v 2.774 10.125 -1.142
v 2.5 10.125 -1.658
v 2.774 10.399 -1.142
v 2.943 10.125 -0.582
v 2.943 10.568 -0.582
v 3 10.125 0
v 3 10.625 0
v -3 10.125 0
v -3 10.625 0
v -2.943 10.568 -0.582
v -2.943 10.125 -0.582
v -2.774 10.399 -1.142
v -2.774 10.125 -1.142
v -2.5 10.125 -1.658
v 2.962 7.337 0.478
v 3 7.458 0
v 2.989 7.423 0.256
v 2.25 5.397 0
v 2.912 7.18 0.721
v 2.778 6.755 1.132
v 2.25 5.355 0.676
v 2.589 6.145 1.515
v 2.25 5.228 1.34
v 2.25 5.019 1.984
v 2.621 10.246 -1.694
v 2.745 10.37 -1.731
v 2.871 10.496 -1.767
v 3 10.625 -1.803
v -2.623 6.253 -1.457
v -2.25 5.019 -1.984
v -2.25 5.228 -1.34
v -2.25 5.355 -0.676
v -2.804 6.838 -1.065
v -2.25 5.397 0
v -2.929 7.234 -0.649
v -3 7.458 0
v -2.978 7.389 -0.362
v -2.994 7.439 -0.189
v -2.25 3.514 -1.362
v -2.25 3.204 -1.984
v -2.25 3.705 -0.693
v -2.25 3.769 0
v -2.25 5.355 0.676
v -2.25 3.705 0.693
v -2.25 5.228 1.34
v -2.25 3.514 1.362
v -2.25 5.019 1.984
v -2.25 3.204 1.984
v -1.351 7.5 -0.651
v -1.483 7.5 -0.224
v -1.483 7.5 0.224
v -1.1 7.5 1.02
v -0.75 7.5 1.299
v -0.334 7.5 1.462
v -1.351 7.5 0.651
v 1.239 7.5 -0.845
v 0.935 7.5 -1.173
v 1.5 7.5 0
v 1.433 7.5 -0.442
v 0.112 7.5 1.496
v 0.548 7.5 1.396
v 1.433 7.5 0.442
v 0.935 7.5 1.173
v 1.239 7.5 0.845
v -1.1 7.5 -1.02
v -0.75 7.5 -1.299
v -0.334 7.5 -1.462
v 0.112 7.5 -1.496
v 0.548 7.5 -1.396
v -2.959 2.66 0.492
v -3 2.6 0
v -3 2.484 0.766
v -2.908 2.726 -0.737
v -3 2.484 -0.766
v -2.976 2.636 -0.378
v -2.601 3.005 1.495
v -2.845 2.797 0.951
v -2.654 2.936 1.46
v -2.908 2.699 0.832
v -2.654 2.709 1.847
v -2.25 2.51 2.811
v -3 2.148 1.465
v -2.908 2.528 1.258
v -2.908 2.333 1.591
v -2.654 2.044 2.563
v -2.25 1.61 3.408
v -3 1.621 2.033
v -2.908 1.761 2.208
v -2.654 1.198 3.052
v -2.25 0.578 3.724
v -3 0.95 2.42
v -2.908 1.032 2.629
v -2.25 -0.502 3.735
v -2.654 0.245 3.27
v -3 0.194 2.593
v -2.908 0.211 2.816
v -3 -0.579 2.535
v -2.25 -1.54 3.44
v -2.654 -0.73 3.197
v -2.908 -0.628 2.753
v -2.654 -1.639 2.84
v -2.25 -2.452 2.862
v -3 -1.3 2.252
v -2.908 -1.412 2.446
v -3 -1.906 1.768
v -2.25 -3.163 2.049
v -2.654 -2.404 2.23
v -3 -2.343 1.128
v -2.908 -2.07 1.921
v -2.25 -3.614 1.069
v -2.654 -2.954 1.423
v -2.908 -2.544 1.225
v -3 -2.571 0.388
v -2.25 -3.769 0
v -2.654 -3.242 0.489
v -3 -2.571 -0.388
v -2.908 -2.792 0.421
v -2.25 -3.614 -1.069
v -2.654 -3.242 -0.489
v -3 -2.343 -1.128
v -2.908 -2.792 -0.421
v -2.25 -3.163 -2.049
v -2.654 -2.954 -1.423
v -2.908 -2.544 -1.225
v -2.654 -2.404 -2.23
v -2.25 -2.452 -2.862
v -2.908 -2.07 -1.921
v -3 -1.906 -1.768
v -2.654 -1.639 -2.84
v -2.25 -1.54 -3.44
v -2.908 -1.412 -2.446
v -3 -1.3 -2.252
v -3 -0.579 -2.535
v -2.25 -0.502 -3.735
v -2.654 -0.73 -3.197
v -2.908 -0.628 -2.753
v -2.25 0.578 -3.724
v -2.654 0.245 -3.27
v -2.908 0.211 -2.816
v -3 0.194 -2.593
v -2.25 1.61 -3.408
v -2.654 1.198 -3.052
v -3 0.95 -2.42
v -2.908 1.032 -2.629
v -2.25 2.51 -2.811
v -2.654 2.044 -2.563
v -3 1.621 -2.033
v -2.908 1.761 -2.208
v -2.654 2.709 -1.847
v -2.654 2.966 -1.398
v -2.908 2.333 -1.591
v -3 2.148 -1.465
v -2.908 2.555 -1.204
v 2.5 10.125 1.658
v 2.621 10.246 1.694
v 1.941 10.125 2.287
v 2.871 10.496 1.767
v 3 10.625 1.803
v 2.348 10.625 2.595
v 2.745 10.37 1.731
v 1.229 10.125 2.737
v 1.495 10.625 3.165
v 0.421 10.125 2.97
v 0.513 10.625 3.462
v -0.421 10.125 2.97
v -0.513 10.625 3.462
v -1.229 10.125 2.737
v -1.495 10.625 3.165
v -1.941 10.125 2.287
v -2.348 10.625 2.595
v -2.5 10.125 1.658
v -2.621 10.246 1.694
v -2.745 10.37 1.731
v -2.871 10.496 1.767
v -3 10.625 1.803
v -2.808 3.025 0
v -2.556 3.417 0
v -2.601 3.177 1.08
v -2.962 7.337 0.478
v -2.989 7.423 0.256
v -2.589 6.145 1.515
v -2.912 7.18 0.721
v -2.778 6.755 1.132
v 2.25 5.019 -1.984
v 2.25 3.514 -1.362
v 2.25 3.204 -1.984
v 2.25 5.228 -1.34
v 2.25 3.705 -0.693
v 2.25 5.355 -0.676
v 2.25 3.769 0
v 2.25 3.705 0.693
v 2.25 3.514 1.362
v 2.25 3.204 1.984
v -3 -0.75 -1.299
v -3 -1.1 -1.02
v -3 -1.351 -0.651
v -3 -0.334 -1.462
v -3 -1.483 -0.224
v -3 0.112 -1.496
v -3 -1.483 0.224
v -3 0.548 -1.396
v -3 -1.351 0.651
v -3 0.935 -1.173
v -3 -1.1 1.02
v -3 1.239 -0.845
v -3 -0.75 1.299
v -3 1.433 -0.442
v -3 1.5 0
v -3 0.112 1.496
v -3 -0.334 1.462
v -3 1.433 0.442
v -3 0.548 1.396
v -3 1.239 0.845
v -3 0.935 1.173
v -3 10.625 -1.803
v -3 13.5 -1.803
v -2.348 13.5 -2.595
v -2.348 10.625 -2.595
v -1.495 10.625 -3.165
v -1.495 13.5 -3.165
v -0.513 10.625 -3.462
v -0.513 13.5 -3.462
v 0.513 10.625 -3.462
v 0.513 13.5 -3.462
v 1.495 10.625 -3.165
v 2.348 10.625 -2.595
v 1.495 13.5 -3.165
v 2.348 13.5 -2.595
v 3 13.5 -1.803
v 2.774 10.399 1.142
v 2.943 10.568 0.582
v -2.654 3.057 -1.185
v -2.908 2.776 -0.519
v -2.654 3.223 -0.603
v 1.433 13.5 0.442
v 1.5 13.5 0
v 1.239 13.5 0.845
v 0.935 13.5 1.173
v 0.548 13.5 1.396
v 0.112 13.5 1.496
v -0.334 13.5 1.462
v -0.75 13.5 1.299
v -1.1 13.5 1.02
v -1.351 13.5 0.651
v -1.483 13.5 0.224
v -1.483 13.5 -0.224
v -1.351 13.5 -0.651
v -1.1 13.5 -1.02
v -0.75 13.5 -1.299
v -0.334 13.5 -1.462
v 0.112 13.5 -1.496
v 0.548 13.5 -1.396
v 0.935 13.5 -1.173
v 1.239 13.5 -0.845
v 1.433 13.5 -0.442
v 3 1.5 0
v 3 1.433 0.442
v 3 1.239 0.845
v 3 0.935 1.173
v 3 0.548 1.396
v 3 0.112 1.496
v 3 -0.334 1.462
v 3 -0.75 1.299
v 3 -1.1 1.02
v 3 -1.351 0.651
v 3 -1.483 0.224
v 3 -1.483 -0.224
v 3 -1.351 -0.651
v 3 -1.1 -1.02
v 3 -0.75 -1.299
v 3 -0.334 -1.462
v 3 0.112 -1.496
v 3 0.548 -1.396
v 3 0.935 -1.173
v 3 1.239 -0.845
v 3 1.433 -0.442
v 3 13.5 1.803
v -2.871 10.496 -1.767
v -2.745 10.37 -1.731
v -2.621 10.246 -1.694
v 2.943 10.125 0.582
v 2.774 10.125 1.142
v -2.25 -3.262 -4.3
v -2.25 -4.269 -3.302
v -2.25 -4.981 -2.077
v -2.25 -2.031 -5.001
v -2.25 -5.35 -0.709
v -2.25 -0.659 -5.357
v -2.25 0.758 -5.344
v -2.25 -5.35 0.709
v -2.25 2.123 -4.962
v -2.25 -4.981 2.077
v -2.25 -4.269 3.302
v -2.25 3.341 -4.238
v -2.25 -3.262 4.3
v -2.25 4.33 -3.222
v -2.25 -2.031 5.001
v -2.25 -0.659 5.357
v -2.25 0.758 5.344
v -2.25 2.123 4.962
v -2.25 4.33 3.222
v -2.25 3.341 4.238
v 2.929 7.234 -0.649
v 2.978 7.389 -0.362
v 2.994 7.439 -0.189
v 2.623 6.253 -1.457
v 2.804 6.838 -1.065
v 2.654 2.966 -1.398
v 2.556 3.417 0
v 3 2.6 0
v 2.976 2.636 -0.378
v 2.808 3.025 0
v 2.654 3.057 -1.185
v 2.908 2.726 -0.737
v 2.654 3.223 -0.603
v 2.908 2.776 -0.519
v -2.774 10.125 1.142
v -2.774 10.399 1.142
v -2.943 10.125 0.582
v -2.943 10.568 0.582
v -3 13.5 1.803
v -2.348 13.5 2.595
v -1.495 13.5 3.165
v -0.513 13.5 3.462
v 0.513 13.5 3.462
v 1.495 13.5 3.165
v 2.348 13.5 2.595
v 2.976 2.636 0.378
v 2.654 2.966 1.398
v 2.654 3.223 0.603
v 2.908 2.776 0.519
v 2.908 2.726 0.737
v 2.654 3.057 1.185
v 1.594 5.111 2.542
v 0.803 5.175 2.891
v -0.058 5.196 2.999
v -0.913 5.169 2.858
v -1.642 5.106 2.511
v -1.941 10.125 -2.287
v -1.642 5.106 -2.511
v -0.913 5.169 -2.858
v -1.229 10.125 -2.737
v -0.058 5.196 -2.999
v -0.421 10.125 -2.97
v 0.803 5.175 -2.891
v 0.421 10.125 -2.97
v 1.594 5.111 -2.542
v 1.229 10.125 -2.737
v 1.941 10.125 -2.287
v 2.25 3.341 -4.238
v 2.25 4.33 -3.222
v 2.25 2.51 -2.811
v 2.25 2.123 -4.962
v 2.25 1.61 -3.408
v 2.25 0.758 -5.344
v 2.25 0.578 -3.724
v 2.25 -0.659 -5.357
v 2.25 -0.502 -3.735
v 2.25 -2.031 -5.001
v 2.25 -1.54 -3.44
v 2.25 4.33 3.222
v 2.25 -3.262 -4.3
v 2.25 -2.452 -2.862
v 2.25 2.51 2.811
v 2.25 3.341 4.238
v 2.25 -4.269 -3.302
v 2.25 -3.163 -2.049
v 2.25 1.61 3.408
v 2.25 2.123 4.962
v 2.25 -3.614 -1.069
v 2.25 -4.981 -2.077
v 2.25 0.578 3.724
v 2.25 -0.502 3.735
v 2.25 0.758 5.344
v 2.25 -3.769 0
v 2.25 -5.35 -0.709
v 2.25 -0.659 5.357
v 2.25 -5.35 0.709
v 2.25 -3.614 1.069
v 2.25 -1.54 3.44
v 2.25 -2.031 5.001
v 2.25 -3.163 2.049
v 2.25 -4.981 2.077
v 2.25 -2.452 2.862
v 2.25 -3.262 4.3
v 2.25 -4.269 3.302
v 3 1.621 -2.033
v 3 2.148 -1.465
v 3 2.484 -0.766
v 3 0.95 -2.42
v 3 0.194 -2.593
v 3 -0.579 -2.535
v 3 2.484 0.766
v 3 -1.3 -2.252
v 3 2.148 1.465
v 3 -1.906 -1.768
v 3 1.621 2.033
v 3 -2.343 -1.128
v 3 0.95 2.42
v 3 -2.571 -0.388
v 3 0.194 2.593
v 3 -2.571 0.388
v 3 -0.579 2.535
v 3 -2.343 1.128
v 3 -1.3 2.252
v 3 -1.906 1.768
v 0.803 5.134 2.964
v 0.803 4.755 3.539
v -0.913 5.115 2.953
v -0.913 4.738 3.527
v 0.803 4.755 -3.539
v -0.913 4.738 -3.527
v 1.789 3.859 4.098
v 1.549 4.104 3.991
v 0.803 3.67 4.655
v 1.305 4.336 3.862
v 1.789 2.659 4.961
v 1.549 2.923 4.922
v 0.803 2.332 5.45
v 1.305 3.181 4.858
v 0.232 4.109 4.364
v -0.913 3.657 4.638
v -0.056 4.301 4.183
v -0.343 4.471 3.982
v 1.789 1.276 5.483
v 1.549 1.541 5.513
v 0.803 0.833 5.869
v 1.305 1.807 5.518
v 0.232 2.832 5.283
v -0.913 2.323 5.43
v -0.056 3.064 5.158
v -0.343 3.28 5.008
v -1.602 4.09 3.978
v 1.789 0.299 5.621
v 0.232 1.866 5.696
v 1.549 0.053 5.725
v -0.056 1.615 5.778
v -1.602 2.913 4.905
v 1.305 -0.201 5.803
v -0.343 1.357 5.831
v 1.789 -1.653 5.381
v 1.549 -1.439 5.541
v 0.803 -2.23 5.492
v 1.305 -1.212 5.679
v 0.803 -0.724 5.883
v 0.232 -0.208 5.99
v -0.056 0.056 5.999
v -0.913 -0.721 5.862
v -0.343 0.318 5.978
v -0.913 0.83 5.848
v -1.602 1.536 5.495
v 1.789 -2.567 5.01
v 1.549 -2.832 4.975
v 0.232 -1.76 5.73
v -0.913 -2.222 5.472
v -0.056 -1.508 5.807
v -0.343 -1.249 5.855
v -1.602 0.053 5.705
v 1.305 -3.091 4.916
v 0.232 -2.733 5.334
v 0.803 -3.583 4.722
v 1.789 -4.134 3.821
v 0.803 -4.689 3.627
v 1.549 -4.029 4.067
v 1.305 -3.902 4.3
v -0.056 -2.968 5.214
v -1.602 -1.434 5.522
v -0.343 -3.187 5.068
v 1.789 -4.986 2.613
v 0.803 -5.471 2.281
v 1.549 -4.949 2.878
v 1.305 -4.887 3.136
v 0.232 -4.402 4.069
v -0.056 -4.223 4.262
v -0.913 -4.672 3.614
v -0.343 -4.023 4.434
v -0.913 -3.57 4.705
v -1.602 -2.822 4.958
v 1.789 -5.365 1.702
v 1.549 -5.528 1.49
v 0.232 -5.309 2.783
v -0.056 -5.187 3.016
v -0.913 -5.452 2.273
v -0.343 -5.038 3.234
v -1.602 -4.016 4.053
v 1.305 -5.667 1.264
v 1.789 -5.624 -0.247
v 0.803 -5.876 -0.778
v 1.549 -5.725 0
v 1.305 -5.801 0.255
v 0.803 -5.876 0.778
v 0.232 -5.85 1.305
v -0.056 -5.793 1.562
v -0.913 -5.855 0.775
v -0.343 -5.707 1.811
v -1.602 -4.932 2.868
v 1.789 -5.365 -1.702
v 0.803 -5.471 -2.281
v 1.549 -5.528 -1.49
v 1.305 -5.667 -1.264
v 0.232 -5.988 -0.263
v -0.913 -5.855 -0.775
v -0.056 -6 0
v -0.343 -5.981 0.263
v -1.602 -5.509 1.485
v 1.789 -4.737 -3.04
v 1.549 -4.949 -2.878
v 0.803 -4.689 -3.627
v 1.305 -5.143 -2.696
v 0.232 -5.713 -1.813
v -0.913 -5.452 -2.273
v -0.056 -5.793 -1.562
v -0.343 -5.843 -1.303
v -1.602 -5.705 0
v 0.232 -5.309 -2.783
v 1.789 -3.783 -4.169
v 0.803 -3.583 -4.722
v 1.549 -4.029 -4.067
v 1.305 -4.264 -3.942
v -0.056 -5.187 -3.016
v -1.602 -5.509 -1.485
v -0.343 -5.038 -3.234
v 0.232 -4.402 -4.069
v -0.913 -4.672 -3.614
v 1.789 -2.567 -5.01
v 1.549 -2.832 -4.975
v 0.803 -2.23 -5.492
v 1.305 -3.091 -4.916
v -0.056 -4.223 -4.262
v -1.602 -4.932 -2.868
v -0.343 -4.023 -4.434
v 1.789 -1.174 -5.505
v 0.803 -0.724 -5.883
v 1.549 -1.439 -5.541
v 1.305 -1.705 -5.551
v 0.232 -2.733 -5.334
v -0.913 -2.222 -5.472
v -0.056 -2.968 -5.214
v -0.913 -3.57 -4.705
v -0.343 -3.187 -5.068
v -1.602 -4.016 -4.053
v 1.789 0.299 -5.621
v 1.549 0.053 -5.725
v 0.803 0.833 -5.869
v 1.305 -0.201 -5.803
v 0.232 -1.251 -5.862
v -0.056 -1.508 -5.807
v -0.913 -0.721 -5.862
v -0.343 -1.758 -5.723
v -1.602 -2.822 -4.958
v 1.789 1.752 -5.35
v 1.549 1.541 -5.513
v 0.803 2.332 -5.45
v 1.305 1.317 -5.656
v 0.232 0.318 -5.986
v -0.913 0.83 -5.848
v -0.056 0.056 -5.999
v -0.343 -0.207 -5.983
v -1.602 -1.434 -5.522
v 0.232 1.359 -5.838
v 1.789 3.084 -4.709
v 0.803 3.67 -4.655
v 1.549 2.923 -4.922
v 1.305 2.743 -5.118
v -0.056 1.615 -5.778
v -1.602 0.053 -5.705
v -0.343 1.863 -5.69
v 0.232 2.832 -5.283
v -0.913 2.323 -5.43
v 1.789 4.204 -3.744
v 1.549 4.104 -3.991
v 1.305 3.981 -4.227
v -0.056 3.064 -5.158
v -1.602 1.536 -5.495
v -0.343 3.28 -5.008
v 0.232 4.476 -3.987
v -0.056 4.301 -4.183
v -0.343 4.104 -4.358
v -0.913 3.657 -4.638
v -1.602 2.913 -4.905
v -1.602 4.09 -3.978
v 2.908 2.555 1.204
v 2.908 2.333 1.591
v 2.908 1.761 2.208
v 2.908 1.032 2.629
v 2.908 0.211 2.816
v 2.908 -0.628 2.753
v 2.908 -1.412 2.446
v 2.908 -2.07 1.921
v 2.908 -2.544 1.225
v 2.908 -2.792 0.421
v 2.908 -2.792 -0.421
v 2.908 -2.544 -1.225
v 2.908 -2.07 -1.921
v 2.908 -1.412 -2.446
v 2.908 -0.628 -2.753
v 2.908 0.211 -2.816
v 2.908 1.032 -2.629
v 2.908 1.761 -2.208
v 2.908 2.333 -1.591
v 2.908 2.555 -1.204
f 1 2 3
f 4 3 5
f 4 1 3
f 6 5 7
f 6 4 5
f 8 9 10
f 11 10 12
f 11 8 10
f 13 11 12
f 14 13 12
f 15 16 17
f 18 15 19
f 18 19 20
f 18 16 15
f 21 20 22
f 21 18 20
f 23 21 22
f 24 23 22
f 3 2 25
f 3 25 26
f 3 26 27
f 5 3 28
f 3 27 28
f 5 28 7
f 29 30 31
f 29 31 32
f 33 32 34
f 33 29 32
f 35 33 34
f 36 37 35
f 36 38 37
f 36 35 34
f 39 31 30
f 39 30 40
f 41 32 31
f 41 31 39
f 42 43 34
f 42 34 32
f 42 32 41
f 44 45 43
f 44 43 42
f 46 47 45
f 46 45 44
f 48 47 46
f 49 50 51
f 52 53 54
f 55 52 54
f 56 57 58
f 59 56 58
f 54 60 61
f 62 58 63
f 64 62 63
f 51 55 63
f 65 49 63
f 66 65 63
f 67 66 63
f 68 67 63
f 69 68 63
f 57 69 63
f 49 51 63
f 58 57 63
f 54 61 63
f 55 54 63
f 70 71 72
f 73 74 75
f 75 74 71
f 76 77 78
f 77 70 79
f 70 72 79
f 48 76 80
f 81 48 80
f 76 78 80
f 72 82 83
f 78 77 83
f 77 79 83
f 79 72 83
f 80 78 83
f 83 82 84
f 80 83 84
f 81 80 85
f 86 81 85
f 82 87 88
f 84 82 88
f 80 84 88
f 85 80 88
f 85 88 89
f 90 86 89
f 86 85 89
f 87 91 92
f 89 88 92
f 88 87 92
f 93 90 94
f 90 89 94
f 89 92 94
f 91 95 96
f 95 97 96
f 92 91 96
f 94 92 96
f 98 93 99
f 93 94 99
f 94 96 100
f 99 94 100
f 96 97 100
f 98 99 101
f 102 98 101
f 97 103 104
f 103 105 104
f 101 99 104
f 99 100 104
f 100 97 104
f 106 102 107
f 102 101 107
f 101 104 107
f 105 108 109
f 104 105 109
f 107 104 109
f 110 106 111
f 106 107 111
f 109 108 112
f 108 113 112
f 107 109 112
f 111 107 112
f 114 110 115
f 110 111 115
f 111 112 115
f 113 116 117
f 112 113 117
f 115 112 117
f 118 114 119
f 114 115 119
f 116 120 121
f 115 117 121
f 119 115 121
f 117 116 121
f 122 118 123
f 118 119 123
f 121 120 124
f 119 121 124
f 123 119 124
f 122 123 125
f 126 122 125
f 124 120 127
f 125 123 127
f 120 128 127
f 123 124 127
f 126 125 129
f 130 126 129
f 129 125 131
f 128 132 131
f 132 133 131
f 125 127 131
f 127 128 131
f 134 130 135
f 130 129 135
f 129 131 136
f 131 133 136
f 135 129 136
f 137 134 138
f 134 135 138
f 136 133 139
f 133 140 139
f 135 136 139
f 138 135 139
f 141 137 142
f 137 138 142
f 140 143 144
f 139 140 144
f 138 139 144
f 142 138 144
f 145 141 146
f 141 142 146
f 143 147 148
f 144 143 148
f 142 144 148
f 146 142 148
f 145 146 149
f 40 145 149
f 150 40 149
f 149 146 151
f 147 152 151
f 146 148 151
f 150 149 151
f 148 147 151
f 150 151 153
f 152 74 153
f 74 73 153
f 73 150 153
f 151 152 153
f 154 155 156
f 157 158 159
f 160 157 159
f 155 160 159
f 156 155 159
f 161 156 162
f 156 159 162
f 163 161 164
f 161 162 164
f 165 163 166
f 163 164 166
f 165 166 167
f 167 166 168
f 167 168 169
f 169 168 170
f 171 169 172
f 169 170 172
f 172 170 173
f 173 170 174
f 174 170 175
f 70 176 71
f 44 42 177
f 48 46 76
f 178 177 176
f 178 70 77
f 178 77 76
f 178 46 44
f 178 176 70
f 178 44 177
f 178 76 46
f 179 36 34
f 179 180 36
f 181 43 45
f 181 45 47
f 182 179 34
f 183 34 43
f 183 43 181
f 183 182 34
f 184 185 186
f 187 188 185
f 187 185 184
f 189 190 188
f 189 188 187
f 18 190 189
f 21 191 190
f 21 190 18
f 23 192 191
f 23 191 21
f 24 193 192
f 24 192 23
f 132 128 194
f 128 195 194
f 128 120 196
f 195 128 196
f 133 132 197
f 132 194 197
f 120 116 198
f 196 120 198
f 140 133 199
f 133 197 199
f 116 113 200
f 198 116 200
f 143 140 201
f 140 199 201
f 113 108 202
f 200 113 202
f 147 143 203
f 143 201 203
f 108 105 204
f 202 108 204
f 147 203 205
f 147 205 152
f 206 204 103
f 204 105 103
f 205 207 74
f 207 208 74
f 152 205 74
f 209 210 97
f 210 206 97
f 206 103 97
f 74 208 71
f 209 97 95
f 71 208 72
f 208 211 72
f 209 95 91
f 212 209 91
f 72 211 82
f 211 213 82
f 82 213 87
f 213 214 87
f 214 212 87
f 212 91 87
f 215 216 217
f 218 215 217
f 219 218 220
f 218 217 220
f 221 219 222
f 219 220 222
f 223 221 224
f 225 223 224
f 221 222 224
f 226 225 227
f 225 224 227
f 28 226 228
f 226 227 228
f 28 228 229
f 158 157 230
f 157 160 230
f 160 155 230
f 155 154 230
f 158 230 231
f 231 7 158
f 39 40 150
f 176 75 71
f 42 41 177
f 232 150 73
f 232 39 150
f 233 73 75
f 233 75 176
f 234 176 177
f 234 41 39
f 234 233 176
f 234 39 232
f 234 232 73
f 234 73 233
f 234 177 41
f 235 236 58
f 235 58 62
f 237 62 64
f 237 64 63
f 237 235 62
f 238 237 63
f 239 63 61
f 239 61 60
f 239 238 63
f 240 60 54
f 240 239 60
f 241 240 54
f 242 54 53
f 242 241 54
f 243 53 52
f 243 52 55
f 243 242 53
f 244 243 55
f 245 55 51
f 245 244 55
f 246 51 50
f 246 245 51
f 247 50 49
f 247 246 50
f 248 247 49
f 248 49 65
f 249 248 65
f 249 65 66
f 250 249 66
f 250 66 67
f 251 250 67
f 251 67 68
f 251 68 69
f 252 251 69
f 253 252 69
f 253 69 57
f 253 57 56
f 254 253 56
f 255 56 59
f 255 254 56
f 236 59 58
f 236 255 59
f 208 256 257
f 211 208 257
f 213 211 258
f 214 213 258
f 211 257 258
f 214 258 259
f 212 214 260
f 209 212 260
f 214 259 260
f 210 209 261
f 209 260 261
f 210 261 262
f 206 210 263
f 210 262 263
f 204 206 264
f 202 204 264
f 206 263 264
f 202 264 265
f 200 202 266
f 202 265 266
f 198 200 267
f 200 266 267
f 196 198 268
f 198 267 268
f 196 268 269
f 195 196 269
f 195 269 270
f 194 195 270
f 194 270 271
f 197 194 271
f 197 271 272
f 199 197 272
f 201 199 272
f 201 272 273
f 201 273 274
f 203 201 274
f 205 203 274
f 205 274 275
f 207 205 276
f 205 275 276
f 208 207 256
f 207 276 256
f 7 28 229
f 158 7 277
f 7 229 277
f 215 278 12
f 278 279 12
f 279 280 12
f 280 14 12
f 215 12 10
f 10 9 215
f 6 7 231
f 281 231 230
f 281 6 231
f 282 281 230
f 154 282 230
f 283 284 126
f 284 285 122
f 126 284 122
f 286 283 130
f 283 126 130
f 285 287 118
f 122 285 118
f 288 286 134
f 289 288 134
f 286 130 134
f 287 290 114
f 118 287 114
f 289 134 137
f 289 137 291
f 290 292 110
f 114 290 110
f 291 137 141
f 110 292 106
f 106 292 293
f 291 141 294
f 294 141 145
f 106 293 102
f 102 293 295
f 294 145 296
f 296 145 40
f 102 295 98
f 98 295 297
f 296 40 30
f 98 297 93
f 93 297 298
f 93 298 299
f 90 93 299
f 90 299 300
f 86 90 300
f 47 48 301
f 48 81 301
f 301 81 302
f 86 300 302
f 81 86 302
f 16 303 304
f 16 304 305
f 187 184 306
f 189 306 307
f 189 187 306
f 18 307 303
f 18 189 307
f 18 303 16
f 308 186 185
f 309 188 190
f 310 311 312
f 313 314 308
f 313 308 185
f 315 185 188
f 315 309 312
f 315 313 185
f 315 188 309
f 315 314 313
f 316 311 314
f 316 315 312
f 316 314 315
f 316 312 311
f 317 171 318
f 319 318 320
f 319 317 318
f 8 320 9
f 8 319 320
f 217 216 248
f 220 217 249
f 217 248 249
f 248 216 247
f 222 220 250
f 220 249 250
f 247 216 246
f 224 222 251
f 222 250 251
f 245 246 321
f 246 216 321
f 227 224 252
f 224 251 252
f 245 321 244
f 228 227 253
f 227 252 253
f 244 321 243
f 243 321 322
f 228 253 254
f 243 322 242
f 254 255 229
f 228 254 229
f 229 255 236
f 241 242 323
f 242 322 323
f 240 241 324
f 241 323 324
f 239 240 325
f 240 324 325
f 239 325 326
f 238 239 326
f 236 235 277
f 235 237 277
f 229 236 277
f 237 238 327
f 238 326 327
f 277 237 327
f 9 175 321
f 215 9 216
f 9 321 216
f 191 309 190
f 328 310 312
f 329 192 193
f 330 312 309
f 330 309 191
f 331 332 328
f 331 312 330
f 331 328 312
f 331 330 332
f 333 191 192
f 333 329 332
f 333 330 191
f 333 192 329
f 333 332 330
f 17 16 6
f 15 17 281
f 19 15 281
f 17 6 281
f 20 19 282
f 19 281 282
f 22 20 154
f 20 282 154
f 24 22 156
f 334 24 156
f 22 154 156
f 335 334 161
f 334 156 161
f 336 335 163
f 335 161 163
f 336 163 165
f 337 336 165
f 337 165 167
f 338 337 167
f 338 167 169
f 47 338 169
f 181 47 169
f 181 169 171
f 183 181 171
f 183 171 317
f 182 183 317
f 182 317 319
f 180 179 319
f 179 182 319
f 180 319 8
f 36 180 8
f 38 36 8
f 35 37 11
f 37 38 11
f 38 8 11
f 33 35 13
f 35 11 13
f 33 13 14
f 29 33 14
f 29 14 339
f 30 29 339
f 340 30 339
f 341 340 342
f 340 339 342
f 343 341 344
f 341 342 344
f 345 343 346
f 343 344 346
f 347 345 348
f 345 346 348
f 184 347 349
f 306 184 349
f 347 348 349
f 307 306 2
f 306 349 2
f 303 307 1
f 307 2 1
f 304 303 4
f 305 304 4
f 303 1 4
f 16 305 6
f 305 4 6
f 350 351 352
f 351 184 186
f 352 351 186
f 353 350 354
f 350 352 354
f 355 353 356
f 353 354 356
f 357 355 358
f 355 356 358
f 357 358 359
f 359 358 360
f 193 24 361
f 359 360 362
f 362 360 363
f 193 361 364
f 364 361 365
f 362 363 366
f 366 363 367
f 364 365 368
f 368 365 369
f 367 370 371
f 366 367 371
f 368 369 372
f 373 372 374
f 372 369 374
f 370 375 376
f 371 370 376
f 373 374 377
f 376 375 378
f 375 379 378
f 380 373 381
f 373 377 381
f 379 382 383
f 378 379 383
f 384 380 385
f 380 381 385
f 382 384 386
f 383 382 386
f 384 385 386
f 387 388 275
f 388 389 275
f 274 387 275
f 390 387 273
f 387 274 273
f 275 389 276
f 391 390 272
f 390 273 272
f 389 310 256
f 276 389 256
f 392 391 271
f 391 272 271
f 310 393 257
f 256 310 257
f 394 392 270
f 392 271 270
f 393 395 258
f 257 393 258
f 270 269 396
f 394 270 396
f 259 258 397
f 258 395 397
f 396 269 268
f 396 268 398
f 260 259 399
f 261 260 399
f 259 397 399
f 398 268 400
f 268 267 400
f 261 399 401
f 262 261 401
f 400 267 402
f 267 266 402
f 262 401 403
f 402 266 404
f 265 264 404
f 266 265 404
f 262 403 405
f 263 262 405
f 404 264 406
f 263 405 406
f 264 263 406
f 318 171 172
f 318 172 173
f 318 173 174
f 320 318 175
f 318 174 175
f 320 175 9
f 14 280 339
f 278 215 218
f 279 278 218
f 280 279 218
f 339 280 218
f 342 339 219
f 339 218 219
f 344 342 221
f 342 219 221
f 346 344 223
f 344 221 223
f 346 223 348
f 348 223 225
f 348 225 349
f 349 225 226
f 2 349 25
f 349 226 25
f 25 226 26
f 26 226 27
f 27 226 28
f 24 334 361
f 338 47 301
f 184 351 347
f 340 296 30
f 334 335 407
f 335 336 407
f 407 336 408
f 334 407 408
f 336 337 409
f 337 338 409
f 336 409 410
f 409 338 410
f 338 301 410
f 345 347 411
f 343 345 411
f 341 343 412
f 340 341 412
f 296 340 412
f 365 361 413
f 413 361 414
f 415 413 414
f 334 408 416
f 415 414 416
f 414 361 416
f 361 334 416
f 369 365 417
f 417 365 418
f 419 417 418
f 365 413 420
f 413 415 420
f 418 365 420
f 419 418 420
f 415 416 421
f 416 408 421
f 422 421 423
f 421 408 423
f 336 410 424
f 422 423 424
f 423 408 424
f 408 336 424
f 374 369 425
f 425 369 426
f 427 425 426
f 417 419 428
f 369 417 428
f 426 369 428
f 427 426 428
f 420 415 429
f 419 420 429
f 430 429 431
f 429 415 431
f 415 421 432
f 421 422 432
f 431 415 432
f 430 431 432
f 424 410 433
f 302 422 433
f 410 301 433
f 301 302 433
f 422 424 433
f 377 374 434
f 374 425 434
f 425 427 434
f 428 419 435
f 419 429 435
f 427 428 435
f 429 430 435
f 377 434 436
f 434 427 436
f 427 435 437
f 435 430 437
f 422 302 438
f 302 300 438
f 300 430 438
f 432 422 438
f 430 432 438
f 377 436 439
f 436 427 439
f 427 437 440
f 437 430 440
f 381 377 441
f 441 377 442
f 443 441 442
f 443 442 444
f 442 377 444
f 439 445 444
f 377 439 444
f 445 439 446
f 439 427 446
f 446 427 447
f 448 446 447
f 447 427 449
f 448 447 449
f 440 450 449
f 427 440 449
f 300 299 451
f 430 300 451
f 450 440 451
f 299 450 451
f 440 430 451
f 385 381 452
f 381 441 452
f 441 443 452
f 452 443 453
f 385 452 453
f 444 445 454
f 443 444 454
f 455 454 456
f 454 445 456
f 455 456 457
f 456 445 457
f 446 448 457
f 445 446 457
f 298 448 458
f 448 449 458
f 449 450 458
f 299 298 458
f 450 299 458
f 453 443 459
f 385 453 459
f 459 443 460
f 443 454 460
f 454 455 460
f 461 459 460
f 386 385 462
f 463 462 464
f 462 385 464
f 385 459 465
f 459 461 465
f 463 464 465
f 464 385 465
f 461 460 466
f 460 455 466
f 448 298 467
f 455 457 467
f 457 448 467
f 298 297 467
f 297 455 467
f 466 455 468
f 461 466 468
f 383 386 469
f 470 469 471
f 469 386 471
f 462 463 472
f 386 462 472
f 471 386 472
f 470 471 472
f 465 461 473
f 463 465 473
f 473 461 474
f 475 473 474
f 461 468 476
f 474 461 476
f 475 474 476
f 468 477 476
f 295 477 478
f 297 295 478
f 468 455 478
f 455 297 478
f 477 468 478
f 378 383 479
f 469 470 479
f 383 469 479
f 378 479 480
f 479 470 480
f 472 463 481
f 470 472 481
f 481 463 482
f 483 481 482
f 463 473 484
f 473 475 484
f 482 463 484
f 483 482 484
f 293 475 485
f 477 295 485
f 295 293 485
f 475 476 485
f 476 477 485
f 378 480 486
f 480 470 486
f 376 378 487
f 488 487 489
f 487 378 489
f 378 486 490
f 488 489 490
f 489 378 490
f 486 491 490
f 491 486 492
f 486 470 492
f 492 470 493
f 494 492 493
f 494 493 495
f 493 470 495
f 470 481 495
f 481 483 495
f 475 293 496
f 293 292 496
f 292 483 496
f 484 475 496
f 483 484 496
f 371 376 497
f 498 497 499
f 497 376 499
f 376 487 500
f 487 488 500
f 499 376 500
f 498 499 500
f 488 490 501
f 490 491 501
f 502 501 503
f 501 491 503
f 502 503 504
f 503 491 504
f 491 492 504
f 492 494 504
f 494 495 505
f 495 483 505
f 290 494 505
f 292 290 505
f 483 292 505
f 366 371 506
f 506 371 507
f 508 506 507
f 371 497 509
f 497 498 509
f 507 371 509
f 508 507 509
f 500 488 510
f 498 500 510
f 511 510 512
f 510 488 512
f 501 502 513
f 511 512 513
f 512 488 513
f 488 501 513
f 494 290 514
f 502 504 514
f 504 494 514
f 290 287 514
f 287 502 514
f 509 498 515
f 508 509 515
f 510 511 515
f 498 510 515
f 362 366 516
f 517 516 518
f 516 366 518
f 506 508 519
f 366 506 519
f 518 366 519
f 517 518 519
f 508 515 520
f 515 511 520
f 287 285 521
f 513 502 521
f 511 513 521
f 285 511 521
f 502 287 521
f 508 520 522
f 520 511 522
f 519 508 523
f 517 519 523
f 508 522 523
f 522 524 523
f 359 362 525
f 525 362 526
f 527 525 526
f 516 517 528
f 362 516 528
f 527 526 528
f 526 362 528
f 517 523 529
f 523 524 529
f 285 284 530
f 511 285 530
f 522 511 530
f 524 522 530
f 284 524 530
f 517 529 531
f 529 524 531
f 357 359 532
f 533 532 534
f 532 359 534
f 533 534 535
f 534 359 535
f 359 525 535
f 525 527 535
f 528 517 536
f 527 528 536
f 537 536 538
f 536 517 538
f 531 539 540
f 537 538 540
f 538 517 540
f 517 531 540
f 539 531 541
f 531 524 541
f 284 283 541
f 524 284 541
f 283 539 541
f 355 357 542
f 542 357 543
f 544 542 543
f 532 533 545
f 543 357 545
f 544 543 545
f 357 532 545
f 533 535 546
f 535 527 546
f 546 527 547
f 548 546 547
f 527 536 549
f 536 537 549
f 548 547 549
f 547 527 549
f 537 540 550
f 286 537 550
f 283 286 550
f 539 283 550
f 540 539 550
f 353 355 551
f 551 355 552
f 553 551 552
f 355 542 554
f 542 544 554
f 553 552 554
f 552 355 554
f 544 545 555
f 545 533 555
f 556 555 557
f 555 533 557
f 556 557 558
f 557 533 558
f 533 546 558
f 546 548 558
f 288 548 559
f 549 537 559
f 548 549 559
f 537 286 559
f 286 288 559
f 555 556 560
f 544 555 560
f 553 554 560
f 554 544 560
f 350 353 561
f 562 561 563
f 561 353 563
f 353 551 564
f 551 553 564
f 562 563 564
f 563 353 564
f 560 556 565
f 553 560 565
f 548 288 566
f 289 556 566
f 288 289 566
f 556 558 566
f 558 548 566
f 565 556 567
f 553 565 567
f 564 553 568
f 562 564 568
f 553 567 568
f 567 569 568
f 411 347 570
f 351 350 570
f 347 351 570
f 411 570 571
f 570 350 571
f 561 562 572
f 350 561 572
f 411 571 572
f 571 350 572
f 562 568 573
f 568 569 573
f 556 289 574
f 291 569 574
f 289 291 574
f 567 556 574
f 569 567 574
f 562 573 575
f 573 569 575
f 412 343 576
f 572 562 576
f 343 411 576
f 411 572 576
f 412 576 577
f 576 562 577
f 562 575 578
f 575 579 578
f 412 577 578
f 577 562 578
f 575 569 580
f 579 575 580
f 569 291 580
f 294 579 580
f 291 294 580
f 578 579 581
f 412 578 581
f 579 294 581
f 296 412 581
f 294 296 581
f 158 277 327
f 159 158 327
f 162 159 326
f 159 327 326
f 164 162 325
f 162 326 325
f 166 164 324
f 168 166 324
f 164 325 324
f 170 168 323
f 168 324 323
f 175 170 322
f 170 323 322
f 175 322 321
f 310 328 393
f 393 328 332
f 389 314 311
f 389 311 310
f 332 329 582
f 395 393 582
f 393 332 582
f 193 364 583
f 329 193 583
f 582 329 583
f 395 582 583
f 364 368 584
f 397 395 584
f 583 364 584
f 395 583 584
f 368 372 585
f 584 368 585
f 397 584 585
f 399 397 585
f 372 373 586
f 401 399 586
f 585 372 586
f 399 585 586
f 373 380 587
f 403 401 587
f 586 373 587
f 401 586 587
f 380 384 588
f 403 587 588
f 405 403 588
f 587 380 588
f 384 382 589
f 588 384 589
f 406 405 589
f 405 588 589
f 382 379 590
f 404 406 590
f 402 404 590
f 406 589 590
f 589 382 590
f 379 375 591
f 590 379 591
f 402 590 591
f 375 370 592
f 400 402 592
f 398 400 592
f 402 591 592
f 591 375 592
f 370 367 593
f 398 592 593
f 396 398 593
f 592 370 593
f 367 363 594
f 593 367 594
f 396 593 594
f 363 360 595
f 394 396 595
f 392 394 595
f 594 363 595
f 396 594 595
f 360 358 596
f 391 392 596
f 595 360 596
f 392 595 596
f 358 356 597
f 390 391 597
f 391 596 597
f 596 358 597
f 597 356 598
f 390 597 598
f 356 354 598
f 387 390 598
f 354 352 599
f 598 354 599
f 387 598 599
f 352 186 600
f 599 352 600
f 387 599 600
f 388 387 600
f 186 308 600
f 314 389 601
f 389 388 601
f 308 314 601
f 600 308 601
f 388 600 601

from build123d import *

# Parameters (mm, degrees)
F8_R          = 1.5
F10_DEPTH     = 3.375
F11_DEPTH     = 6
F12_T2_ANGLE  = 160.1226593158
F12_T6_DEPTH  = 3.0886171317
F12_S7_R      = 3
F12_T8_DEPTH  = 3
F12_T12_DEPTH = 3.0886171317
F12_S13_R     = 3
F12_T14_DEPTH = 3
F12_T16_ANGLE = 160.1226593158
F12_T20_DEPTH = 3.0886171317
F12_S21_R     = 3
F12_T22_DEPTH = 3
F12_T26_DEPTH = 3.0886171317
F12_S27_R     = 3
F12_T28_DEPTH = 3


# Not quite as in the source:
# - a fillet or chamfer that OpenCascade refuses, or shapes differently, is made with other operations: its cross-section is extruded or revolved along the edge and cut away or added


with BuildPart() as f6:
    # F5 (on Top) → F6 (revolve)
    with BuildSketch(Plane.XY):
        with BuildLine():
            Line((-3, 2.6), (-3, 1.5))
            Line((-3, 1.5), (3, 1.5))
            Line((3, 1.5), (3, 2.6))
            ThreePointArc((3, 2.6), (2.689266509, 3.2256435447), (2.25, 3.7688102609))
            ThreePointArc((2.25, 3.7688102609), (0, 4.6953090617), (-2.25, 3.7688102609))
            ThreePointArc((-2.25, 3.7688102609), (-2.689266509, 3.2256435447), (-3, 2.6))
        make_face()
        with BuildLine():
            Line((-2.25, 5.397114317), (-2.25, 3.7688102609))
            ThreePointArc((-2.25, 3.7688102609), (0, 4.6953090617), (2.25, 3.7688102609))
            Line((2.25, 3.7688102609), (2.25, 5.397114317))
            ThreePointArc((2.25, 5.397114317), (0, 6), (-2.25, 5.397114317))
        make_face()
    revolve(axis=Axis((0, 0, 0), (1, 0, 0)))

    # F8 (on offset) → F9 (join, up to the next surface of F6)
    with BuildSketch(Plane.XZ.offset(-13.5)):
        with BuildLine():
            ThreePointArc((-3, 0), (0, -3), (3, 0))
            ThreePointArc((3, 0), (0, 3), (-3, 0))
        make_face()
        Circle(F8_R, mode=Mode.SUBTRACT)
        Circle(F8_R)
    extrude(until=Until.NEXT)

    # F8 (on offset) → F10 (join)
    with BuildSketch(Plane.XZ.offset(-13.5)):
        with BuildLine():
            ThreePointArc((-3, 0), (0, 3), (3, 0))
            Line((3, 0), (3, 1.8027756377))
            ThreePointArc((3, 1.8027756377), (0, 3.5), (-3, 1.8027756377))
            Line((-3, 1.8027756377), (-3, 0))
        make_face()
        with BuildLine():
            Line((3, -1.8027756377), (3, 0))
            ThreePointArc((3, 0), (0, -3), (-3, 0))
            Line((-3, 0), (-3, -1.8027756377))
            ThreePointArc((-3, -1.8027756377), (0, -3.5), (3, -1.8027756377))
        make_face()
    extrude(amount=F10_DEPTH)

    # F8 (on offset) → F11 (cut)
    with BuildSketch(Plane.XZ.offset(-13.5)):
        Circle(F8_R)
    extrude(amount=F11_DEPTH, mode=Mode.SUBTRACT)

    # F12: chamfer of 0.5 on 6 edges, made by hand

    # F12_s1 → F12_t2 (revolve, cut)
    with BuildSketch(Plane(origin=(0, 0, 0), x_dir=(0, 1, 0), z_dir=(0.1725939358, 0, -0.9849930626))):
        Polygon((10.125, 3), (10.625, 3.5), (10.125, 3.5), align=None)
    revolve(axis=Axis((0, 10.125, 0), (0, -1, 0)), revolution_arc=F12_T2_ANGLE, mode=Mode.SUBTRACT)


with BuildPart() as f12_tool4:
    # F12_s5 → F12_t6 (new body)
    with BuildSketch(Plane.XY):
        Polygon((2.5, 10.125), (3, 10.625), (3, 10.125), align=None)
    extrude(amount=F12_T6_DEPTH)

    # F12_s7 → F12_t8 (cut, symmetric)
    with BuildSketch(Plane.XZ.offset(-10.4)):
        Circle(F12_S7_R)
    extrude(amount=F12_T8_DEPTH, both=True, mode=Mode.SUBTRACT)


with BuildPart() as f6_1:
    add(f6.part)

    # F12_t3: cut F12_tool4
    add(f12_tool4.part, mode=Mode.SUBTRACT)


with BuildPart() as f12_tool10:
    # F12_s11 → F12_t12 (new body)
    with BuildSketch(Plane.XY.offset(3.0886171317)):
        Polygon((-2.5, 10.125), (-3, 10.625), (-3, 10.125), align=None)
    extrude(amount=-F12_T12_DEPTH)

    # F12_s13 → F12_t14 (cut, symmetric)
    with BuildSketch(Plane.XZ.offset(-10.4)):
        Circle(F12_S13_R)
    extrude(amount=F12_T14_DEPTH, both=True, mode=Mode.SUBTRACT)


with BuildPart() as f6_2:
    add(f6_1.part)

    # F12_t9: cut F12_tool10
    add(f12_tool10.part, mode=Mode.SUBTRACT)

    # F12_s15 → F12_t16 (revolve, cut)
    with BuildSketch(Plane(origin=(0, 0, 0), x_dir=(0, 1, 0), z_dir=(-0.1725939358, 0, 0.9849930626))):
        Polygon((10.125, 3), (10.625, 3.5), (10.125, 3.5), align=None)
    revolve(axis=Axis((0, 10.125, 0), (0, -1, 0)), revolution_arc=F12_T16_ANGLE, mode=Mode.SUBTRACT)


with BuildPart() as f12_tool18:
    # F12_s19 → F12_t20 (new body)
    with BuildSketch(Plane.XY.offset(-3.0886171317)):
        Polygon((2.5, 10.125), (3, 10.625), (3, 10.125), align=None)
    extrude(amount=F12_T20_DEPTH)

    # F12_s21 → F12_t22 (cut, symmetric)
    with BuildSketch(Plane.XZ.offset(-10.4)):
        Circle(F12_S21_R)
    extrude(amount=F12_T22_DEPTH, both=True, mode=Mode.SUBTRACT)


with BuildPart() as f6_3:
    add(f6_2.part)

    # F12_t17: cut F12_tool18
    add(f12_tool18.part, mode=Mode.SUBTRACT)


with BuildPart() as f12_tool24:
    # F12_s25 → F12_t26 (new body)
    with BuildSketch(Plane.XY):
        Polygon((-2.5, 10.125), (-3, 10.625), (-3, 10.125), align=None)
    extrude(amount=-F12_T26_DEPTH)

    # F12_s27 → F12_t28 (cut, symmetric)
    with BuildSketch(Plane.XZ.offset(-10.4)):
        Circle(F12_S27_R)
    extrude(amount=F12_T28_DEPTH, both=True, mode=Mode.SUBTRACT)


with BuildPart() as f6_4:
    add(f6_3.part)

    # F12_t23: cut F12_tool24
    add(f12_tool24.part, mode=Mode.SUBTRACT)

    # F5 (on Top) → F13 (revolve, cut)
    with BuildSketch(Plane.XY):
        with BuildLine():
            Line((3, 2.6), (3, 1.5))
            Line((3, 1.5), (5, 1.5))
            Line((5, 1.5), (5, 8.25))
            Line((5, 8.25), (3.2883654704, 8.25))
            Line((3.2883654704, 8.25), (2.25, 5.397114317))
            Line((2.25, 5.397114317), (2.25, 3.7688102609))
            ThreePointArc((2.25, 3.7688102609), (2.689266509, 3.2256435447), (3, 2.6))
        make_face()
        with BuildLine():
            Line((-5, 1.5), (-3, 1.5))
            Line((-3, 1.5), (-3, 2.6))
            ThreePointArc((-3, 2.6), (-2.689266509, 3.2256435447), (-2.25, 3.7688102609))
            Line((-2.25, 3.7688102609), (-2.25, 5.397114317))
            Line((-2.25, 5.397114317), (-3.2883654704, 8.25))
            Line((-3.2883654704, 8.25), (-5, 8.25))
            Line((-5, 8.25), (-5, 1.5))
        make_face()
    revolve(axis=Axis((0, 0, 0), (1, 0, 0)), mode=Mode.SUBTRACT)


solid = f6_4.part
